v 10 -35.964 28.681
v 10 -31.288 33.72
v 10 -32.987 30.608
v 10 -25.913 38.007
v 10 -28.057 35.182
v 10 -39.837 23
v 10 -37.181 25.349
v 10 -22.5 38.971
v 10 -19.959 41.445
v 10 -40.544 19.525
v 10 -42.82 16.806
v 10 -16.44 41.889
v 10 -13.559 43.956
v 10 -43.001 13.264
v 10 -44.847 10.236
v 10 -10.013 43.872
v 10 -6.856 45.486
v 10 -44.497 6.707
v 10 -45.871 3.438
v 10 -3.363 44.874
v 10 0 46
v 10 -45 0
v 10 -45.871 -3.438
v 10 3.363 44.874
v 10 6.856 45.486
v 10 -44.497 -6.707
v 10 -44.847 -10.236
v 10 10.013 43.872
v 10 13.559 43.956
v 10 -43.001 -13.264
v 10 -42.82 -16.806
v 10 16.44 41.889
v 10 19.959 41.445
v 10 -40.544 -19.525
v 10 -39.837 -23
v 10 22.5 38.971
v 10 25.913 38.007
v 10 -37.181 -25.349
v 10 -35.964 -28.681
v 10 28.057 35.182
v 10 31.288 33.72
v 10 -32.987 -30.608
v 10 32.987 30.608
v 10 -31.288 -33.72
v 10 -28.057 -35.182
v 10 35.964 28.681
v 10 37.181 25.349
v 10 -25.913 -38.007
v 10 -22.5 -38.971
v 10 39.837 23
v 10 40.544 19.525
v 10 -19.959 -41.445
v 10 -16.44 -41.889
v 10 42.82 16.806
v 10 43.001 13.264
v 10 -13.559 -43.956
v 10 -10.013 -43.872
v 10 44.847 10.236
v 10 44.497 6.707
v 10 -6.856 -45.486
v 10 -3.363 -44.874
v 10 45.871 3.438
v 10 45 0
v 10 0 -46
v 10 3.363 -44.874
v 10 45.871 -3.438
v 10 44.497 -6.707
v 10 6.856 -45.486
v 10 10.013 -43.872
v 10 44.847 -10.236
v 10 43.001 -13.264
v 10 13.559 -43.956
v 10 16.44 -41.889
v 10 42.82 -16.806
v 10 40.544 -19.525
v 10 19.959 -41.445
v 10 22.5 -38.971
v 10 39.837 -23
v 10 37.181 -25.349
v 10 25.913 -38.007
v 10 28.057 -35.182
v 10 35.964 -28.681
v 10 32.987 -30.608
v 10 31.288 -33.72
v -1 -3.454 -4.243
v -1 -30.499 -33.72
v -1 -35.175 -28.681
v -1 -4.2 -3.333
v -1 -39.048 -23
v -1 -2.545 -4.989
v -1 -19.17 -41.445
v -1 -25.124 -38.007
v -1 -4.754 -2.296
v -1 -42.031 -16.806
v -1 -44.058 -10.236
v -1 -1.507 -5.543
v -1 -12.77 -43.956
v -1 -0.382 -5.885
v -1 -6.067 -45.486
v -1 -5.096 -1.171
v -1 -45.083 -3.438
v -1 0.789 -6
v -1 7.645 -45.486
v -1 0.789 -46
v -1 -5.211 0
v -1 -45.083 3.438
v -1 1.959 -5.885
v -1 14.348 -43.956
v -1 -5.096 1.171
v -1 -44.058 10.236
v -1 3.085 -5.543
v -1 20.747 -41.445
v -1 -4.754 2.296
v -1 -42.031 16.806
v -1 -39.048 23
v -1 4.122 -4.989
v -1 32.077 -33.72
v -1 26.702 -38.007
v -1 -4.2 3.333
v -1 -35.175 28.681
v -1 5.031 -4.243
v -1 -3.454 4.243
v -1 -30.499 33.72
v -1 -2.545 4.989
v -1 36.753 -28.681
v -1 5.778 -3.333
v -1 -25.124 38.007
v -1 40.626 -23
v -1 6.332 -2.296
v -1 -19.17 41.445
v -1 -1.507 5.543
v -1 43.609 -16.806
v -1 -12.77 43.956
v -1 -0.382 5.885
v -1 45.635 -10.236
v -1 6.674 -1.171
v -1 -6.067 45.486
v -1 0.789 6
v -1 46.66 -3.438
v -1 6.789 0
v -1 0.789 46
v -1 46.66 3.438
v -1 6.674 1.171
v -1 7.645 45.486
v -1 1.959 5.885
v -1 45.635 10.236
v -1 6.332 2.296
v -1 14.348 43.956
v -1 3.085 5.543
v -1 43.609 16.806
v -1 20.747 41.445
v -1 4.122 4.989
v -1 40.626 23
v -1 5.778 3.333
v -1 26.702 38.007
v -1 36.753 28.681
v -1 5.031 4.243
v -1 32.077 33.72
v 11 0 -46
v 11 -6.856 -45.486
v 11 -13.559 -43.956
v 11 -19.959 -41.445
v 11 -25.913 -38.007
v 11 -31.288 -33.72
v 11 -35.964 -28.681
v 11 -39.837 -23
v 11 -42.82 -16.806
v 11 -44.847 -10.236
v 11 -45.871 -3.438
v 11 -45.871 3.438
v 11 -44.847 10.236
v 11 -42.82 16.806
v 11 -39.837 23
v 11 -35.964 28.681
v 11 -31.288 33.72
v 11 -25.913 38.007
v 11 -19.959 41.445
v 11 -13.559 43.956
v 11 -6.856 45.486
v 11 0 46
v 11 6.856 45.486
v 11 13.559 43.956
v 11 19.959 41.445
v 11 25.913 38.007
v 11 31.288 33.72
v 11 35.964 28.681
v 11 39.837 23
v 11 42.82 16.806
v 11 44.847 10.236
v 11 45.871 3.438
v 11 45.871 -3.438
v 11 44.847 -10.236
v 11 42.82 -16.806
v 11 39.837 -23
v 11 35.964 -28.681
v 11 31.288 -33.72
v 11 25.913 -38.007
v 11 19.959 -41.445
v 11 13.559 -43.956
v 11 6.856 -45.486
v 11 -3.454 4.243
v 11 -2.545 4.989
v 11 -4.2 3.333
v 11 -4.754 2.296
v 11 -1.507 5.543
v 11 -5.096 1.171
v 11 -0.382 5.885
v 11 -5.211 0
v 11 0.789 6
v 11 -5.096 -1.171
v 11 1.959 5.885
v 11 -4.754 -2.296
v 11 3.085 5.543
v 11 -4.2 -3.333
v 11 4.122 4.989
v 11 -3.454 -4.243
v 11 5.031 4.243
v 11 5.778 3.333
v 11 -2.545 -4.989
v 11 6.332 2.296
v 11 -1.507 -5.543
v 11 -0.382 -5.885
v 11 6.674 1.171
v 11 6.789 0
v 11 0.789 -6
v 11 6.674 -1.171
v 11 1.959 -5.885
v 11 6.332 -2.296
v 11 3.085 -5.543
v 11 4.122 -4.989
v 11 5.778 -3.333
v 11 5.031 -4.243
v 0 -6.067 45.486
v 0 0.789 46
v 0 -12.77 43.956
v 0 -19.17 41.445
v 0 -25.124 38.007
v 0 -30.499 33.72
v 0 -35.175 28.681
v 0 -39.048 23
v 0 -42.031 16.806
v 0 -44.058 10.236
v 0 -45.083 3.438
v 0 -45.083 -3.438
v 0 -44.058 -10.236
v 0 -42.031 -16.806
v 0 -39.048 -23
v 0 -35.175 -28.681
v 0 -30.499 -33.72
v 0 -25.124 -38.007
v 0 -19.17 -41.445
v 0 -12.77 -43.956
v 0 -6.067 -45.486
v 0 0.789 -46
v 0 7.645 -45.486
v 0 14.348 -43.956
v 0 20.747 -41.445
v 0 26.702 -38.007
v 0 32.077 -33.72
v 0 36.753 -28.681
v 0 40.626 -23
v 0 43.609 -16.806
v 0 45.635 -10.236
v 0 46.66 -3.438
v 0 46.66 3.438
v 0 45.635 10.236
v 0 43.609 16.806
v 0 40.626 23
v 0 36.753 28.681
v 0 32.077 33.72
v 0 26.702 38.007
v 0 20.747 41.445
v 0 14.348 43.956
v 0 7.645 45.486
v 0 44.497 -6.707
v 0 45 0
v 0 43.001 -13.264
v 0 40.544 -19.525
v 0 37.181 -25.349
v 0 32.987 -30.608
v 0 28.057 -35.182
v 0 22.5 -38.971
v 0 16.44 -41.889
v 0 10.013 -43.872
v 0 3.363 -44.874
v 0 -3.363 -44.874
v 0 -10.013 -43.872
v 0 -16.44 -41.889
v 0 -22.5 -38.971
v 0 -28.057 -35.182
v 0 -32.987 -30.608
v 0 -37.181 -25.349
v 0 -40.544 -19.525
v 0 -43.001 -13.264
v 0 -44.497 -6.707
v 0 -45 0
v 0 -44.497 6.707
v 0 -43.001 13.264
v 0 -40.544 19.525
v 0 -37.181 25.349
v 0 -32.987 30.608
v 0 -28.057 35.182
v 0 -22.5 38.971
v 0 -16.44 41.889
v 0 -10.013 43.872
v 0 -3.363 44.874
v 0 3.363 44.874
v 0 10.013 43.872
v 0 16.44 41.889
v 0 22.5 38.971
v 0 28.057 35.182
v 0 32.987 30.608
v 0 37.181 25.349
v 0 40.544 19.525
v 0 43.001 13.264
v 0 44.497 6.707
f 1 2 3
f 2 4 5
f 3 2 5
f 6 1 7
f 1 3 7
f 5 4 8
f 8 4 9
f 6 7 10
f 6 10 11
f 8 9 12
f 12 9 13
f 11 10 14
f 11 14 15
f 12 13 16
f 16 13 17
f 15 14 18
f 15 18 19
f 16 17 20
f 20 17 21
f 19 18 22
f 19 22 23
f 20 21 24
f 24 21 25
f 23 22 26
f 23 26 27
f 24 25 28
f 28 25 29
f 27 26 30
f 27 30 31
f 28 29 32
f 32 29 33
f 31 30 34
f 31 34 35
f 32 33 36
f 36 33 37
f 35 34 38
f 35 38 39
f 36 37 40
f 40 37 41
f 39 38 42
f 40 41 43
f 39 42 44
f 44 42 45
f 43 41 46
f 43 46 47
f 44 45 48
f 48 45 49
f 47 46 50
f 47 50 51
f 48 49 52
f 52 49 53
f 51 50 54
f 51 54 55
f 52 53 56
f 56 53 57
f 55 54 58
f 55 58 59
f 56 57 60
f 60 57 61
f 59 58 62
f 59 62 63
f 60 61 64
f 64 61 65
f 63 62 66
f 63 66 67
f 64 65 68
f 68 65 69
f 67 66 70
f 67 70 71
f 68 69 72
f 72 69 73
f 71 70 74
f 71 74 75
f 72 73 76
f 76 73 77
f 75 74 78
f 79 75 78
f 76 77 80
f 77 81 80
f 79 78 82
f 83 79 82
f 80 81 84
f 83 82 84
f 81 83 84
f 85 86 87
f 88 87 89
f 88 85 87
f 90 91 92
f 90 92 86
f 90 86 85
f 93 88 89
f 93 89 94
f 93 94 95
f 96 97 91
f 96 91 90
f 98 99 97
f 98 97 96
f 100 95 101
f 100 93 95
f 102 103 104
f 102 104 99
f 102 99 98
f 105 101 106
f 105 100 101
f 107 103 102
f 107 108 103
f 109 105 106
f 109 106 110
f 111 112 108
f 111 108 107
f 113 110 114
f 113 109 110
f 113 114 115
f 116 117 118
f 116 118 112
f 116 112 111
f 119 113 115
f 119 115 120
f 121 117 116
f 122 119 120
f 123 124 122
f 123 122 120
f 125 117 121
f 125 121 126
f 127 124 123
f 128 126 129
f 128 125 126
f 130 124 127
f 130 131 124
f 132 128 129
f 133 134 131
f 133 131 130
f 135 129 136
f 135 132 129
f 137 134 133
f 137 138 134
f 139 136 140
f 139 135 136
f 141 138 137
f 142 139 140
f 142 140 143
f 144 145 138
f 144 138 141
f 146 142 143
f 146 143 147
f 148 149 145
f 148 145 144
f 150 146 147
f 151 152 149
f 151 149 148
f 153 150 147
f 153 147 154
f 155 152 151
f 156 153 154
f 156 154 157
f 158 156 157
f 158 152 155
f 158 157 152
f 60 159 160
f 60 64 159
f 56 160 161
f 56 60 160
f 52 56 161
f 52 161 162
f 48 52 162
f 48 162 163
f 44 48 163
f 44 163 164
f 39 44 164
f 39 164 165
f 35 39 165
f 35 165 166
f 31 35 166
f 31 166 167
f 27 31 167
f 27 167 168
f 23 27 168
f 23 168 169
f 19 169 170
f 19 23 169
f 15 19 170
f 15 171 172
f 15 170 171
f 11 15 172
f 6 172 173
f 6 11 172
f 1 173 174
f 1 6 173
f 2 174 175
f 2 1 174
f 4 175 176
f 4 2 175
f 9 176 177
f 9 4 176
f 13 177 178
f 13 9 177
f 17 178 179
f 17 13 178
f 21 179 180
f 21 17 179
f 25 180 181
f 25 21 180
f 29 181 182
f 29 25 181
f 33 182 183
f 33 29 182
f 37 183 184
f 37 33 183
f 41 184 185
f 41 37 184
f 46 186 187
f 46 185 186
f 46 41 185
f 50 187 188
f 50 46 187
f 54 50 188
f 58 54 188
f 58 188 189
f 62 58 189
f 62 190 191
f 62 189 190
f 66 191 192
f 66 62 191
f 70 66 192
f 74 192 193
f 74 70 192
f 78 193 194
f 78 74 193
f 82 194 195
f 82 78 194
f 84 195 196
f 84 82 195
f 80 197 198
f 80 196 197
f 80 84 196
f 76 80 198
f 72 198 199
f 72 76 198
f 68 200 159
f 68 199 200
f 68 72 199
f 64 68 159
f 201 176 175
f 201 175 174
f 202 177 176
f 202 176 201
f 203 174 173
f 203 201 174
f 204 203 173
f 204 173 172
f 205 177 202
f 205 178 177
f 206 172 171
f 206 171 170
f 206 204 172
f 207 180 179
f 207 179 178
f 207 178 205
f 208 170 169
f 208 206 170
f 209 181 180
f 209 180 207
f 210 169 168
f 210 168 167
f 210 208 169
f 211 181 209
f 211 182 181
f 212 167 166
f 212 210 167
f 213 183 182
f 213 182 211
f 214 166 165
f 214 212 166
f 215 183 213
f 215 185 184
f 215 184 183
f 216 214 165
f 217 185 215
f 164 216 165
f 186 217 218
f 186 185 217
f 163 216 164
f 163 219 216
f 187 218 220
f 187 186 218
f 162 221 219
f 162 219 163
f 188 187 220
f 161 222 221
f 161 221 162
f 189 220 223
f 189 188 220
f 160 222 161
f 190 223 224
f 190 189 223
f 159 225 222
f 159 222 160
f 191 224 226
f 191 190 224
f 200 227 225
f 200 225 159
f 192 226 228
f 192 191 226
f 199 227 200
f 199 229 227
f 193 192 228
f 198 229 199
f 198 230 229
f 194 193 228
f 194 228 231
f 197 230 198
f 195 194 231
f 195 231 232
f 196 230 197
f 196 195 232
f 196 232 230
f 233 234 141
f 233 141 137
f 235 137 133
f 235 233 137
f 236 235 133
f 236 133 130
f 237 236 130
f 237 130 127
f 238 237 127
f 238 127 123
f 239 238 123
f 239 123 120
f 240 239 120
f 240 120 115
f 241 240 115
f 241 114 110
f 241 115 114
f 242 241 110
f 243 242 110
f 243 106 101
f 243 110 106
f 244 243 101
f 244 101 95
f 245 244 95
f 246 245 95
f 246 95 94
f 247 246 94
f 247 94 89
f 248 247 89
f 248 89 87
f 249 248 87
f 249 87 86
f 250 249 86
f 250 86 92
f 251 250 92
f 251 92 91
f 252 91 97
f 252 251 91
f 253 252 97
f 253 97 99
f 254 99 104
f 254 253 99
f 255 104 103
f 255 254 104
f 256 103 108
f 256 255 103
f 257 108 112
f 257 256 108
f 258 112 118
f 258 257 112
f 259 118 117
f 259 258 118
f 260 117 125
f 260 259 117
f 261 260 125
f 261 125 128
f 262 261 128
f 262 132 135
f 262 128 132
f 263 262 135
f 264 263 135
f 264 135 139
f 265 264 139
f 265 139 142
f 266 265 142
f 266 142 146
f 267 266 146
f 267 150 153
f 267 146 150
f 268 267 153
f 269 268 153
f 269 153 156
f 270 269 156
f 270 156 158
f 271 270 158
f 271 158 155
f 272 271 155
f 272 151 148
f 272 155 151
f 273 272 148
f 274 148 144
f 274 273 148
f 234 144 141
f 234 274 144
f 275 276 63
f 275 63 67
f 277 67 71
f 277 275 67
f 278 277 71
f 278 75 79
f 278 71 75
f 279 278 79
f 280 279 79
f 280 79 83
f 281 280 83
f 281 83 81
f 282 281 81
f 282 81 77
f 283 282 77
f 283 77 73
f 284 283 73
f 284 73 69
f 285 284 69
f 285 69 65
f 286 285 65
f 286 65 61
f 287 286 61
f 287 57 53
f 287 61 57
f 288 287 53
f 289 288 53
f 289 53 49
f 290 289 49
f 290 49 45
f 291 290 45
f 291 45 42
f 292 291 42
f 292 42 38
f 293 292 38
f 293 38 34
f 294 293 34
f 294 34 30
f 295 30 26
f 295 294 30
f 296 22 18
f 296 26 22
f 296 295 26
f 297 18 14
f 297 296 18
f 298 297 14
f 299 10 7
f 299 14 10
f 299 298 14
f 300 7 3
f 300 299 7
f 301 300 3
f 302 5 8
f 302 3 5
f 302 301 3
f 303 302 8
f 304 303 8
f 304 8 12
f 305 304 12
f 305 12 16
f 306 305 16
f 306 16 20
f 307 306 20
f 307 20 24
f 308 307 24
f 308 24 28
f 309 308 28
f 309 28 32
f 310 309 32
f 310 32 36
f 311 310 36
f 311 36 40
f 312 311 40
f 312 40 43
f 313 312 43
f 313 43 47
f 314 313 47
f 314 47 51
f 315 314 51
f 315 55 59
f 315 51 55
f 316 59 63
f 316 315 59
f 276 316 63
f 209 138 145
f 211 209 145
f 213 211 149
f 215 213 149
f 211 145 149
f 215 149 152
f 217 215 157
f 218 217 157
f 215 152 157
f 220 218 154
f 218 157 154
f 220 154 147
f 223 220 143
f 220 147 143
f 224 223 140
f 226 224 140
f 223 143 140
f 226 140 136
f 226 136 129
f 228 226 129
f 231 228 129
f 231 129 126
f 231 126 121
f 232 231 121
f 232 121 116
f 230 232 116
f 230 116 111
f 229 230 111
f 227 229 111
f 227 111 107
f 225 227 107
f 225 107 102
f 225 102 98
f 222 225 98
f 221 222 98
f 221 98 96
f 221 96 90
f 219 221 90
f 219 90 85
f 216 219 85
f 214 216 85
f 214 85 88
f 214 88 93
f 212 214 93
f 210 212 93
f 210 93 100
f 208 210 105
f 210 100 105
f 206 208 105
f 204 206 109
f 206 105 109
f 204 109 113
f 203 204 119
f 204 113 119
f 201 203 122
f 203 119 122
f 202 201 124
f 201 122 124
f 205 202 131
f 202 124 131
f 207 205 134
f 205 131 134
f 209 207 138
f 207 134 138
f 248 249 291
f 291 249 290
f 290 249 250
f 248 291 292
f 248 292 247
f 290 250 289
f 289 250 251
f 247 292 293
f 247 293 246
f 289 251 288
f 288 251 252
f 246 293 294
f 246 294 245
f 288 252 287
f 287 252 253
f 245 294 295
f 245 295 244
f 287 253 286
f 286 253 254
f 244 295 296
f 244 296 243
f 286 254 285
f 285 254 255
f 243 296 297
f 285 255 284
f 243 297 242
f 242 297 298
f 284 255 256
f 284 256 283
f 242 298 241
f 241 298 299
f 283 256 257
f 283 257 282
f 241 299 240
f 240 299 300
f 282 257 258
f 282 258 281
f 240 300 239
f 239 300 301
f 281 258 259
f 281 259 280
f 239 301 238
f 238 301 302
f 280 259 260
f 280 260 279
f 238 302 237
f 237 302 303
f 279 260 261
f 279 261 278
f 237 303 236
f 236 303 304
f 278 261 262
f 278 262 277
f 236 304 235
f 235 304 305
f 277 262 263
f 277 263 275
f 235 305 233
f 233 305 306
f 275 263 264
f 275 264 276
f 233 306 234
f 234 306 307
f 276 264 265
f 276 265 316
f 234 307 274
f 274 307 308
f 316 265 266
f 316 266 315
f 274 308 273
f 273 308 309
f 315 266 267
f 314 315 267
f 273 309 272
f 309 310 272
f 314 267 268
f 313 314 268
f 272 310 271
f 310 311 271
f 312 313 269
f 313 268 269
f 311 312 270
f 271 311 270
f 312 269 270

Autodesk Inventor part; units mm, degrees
ref_plane "YZ Plane" through (0, 0, 0) normal (1, 0, 0) x (0, 1, 0)
ref_plane "XZ Plane" through (0, 0, 0) normal (0, 1, 0) x (-1, 0, 0)
ref_plane "XY Plane" through (0, 0, 0) normal (0, 0, 1) x (1, 0, 0)
sketch "スケッチ1" plane through (0, 0, 0) normal (1, 0, 0) x (0, 1, 0)
  circle A0 centre (0, 0) radius 45
  dimension "d0" = 90
extrude "押し出し1" add sketch "スケッチ1" along normal blind 10
sketch "スケッチ2" plane through (10, 0, 0) normal (1, 0, 0) x (0, 0, -1)
  circle A0 centre (0, 0) radius 46
  dimension "d3" = 92
extrude "押し出し2" add sketch "スケッチ2" along normal blind 1
sketch "スケッチ3" plane through (0, 0, 0) normal (-1, 0, 0) x (0, 0, 1)
  circle A0 centre (0, 0.7888) radius 46
  point P0 (0, 0)
  dimension "d6" = 92
extrude "押し出し3" add sketch "スケッチ3" along normal blind 1
sketch "スケッチ4" plane through (-1, 0.7888, 0) normal (-1, 0, 0) x (0, 0, 1)
  point P0 (0, -0.7888)
sketch "スケッチ5" plane through (-1, 0.7888, 0) normal (-1, 0, 0) x (0, 0, 1)
  circle A0 centre (0, 0) radius 6
  circle A1 centre (0, 0) radius 46 projected
  point P0 (0, -0.7888)
  dimension "d9" = 12
  dimension "d10" = 40
extrude "押し出し4" cut sketch "スケッチ5" against normal blind 12 contours A0
equation "\"BendRadius\" = Thickness"
equation "\"BendReliefWidth\" = Thickness"
equation "\"BendReliefDepth\" = 0.5 * Thickness"
equation "\"CornerReliefSize\" = 4 * Thickness"
equation "\"MinimumRemnant\" = 2 * Thickness"
equation "\"TransitionRadius\" = BendRadius"
equation "\"JacobiRadiusSize\" = BendRadius"
equation "\"GapSize\" = Thickness"
equation "\"Thickness\" = 0.5"
properties part number "type3" material "アセタール樹脂、白"
